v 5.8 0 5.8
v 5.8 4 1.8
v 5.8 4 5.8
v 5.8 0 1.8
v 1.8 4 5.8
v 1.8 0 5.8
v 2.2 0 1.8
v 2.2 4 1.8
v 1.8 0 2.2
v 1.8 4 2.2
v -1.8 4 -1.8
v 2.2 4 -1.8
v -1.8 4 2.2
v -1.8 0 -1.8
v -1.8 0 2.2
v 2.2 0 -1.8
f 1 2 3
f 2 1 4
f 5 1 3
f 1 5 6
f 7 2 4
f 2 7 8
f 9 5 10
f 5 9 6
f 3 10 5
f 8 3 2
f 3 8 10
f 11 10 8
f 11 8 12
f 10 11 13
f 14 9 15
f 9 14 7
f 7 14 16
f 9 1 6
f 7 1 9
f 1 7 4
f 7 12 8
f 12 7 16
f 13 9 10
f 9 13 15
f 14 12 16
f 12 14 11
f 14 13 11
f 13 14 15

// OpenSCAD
translate([1.8, 0, 1.8]) {
    cube([4,4,4]);
}
translate([-1.8, 0, -1.8]) {
    cube([4,4,4]);
}
